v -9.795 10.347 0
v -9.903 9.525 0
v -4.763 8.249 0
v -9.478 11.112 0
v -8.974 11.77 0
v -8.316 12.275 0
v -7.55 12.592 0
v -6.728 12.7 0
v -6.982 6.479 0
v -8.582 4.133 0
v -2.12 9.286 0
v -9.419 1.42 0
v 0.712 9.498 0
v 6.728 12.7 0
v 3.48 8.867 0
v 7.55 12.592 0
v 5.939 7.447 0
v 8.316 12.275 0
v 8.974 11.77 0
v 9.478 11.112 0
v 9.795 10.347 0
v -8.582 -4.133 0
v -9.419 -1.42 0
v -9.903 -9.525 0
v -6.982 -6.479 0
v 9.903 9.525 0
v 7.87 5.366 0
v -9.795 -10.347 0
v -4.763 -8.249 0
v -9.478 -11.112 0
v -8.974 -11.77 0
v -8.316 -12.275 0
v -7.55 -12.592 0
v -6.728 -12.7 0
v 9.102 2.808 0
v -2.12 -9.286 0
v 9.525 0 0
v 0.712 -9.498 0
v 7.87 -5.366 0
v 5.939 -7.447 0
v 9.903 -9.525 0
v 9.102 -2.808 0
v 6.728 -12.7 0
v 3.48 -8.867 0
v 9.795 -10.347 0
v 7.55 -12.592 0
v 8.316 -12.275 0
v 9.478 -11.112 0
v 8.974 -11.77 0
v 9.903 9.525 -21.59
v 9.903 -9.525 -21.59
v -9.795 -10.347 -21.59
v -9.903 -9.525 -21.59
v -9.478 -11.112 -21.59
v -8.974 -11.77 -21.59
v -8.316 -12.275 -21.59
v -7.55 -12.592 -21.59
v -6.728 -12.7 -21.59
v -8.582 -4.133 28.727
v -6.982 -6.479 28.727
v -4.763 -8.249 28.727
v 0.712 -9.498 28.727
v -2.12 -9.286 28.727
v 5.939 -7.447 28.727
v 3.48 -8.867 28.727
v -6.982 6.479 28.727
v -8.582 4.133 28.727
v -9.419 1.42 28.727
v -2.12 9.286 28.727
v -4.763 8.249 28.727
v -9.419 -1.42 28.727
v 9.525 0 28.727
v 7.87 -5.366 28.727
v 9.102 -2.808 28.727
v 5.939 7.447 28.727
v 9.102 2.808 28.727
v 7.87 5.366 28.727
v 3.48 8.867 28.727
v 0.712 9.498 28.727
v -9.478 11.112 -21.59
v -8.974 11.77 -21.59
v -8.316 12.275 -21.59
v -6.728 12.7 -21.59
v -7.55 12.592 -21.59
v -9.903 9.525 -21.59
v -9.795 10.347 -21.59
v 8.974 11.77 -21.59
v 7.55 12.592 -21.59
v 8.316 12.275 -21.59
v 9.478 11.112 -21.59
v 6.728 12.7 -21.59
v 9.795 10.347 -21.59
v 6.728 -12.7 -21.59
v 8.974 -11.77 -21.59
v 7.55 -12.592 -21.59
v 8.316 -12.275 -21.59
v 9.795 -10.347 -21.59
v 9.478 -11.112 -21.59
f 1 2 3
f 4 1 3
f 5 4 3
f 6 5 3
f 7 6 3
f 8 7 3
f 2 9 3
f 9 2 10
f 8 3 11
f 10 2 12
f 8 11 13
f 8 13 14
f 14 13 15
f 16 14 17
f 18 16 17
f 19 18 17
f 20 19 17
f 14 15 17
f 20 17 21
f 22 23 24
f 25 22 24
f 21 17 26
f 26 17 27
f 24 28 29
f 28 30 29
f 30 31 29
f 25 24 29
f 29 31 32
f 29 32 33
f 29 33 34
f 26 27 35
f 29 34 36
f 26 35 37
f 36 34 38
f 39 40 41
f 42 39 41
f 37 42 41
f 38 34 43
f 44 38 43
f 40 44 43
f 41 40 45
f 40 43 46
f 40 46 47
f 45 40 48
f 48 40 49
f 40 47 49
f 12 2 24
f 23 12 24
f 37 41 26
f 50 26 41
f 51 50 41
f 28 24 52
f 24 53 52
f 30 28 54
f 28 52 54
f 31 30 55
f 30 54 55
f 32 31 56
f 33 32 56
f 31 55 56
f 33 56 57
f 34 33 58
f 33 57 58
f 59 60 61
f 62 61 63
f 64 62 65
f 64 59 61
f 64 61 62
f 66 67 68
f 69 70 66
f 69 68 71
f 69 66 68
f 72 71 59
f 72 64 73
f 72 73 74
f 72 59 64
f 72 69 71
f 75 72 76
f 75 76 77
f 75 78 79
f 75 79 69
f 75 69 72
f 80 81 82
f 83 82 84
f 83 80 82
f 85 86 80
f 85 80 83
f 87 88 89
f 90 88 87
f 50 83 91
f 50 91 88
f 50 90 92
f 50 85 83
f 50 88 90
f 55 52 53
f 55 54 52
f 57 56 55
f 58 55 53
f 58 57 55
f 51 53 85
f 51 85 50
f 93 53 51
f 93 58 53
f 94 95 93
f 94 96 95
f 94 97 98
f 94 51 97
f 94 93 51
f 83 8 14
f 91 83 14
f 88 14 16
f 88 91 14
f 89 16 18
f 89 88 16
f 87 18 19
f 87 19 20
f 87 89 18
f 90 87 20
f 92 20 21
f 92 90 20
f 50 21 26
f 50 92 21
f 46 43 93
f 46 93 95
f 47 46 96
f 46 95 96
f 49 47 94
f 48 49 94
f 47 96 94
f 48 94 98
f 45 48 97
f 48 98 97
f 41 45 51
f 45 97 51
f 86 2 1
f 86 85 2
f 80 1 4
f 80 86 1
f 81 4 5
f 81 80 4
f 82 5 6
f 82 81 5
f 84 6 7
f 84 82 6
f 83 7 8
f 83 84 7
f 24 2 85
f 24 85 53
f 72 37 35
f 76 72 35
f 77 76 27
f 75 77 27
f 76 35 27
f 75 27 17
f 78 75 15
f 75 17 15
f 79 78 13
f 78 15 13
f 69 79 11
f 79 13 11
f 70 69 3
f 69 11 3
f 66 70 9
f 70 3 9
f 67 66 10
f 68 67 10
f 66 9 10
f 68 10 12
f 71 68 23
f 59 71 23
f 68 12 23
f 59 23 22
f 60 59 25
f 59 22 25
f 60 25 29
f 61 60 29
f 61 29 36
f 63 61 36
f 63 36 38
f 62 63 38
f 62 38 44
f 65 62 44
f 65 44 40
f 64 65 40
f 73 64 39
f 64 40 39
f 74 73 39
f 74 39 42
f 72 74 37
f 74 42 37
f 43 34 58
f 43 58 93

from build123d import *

# Parameters (mm, degrees)
F0_R     = 9.525
F1_DEPTH = 28.7274
F2_W     = 19.80688
F2_H     = 25.4
F3_DEPTH = 21.59
F4_R     = 3.175


with BuildPart() as f1:
    # F0 (on Top) → F1 (new body)
    with BuildSketch(Plane.XY):
        Circle(F0_R)
    extrude(amount=F1_DEPTH)

    # F2 (on face) → F3 (join)
    with BuildSketch(Plane(origin=(0, 0, 0), x_dir=(1, 0, 0), z_dir=(0, 0, -1))):
        Rectangle(F2_W, F2_H)
    extrude(amount=F3_DEPTH)

    # F4
    f4_edges = [f1.edges().sort_by_distance(p)[0] for p in [
        (9.90344, -12.7, -10.795),
        (-9.90344, -12.7, -10.795),
        (9.90344, 12.7, -10.795),
        (-9.90344, 12.7, -10.795),
    ]]
    fillet(f4_edges, radius=F4_R)


solid = f1.part
